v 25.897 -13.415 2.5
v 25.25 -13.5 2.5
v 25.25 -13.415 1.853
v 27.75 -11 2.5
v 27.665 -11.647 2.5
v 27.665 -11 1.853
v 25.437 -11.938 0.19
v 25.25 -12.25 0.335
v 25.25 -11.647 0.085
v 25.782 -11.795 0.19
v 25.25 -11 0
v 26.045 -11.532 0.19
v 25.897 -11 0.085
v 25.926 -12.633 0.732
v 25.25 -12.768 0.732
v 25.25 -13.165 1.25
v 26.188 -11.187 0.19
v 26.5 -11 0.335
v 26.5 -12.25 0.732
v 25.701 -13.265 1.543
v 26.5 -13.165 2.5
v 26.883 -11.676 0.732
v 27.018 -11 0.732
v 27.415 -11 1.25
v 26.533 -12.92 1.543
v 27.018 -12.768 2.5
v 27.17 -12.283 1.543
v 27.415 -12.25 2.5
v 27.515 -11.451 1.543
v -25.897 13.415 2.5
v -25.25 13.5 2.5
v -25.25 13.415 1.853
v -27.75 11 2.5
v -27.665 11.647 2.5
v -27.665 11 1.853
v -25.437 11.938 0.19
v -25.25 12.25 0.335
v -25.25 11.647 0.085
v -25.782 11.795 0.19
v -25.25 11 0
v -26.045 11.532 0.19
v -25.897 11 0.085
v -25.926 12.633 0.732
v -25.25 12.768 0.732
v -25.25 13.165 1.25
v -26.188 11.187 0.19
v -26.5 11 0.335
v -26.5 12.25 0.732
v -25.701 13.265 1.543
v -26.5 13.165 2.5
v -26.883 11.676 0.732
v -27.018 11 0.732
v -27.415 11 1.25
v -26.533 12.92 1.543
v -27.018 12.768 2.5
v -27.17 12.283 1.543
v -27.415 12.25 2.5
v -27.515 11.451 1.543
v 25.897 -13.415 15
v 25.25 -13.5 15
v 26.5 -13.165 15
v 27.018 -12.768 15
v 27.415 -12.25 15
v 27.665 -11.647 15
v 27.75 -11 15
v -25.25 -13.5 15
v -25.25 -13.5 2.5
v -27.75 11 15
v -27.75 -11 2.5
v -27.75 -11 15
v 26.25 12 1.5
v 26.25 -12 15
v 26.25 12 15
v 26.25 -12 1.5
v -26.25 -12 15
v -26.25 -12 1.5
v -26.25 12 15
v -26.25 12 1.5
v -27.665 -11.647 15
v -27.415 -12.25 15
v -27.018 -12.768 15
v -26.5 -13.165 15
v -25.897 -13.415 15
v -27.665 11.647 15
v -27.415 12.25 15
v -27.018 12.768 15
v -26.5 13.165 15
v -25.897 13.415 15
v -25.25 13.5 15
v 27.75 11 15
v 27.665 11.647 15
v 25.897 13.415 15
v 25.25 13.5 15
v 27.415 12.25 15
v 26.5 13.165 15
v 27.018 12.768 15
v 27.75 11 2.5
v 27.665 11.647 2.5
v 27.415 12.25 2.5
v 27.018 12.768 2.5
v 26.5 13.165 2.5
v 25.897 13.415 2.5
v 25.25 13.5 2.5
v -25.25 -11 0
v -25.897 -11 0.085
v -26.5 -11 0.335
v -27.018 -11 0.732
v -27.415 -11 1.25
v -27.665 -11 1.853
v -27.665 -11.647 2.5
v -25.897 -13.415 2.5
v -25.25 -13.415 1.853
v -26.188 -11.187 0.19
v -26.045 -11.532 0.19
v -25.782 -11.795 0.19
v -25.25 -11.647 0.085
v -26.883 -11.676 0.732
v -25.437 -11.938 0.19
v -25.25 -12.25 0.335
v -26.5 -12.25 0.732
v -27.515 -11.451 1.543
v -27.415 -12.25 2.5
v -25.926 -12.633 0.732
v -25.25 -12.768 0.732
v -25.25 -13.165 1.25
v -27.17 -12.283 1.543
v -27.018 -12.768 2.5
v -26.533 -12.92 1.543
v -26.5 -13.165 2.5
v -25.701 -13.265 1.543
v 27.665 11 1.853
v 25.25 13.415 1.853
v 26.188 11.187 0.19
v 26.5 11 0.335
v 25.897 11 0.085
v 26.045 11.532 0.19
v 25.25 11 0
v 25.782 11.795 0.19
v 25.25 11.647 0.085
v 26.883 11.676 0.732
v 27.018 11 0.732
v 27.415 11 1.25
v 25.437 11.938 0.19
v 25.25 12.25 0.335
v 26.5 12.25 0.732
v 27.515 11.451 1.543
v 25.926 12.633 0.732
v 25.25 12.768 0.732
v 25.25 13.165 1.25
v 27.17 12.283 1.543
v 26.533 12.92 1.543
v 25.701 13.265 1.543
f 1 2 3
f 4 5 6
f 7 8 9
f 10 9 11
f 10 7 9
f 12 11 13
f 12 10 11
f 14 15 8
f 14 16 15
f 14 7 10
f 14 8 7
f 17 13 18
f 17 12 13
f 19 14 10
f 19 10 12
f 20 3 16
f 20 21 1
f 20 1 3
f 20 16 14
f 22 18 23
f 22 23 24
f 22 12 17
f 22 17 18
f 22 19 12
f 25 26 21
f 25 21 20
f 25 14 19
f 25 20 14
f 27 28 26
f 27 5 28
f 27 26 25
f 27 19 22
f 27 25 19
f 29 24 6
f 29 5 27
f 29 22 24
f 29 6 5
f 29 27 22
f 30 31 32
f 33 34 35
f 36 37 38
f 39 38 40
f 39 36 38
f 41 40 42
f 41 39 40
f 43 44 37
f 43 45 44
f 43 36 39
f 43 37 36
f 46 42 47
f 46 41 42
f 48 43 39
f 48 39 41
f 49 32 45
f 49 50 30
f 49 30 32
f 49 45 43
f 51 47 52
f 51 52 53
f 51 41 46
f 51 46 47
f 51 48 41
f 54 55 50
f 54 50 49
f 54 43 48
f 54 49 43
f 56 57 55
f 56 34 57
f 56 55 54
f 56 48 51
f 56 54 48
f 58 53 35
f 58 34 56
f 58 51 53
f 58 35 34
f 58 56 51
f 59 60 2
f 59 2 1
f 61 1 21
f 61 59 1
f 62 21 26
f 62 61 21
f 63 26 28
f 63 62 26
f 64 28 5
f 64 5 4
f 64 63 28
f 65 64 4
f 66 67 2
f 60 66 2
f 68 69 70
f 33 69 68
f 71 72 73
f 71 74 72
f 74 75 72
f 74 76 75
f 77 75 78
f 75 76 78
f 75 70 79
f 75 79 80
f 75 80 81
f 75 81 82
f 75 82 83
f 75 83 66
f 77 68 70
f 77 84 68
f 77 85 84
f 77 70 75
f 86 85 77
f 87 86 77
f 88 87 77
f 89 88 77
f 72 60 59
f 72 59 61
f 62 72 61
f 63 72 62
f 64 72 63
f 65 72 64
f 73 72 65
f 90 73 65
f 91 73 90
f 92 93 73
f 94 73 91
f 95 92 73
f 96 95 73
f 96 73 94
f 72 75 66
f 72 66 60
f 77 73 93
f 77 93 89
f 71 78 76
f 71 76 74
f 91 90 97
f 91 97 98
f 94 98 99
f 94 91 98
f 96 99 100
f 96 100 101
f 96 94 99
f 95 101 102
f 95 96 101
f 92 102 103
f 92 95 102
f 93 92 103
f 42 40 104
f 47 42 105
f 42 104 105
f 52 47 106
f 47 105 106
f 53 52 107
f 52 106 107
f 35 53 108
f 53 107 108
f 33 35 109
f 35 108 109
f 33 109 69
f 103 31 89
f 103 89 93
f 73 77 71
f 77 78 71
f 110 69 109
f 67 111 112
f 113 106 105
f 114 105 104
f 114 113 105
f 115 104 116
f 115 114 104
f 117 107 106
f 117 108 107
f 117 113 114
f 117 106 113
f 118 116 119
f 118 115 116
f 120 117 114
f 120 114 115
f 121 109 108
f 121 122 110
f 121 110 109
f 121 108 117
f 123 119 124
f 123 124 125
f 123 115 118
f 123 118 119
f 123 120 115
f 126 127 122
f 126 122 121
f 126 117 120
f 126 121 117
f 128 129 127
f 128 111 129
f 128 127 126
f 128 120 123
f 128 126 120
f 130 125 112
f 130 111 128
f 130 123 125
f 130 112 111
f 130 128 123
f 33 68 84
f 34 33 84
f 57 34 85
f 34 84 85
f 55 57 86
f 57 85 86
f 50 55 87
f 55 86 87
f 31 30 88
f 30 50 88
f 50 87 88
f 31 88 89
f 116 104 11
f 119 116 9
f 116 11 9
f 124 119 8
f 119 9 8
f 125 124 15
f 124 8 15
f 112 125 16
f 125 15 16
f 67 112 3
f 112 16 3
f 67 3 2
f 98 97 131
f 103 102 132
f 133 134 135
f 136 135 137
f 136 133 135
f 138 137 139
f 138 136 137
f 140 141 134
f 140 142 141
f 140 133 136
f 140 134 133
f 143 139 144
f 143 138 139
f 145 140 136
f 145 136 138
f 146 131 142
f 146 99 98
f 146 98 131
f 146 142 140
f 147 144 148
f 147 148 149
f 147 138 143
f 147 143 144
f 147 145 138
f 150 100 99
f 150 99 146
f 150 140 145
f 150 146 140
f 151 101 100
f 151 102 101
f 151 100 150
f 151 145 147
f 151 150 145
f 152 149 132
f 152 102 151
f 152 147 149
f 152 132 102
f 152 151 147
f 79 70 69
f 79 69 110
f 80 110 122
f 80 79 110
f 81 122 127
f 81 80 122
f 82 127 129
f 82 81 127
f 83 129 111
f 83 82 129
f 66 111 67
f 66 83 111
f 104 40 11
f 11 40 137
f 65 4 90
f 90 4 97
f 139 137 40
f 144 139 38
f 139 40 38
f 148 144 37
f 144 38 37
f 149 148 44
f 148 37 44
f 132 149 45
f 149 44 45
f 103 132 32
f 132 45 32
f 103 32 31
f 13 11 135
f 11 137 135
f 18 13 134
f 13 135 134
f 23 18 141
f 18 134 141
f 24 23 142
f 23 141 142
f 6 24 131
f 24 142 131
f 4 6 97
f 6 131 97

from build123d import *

# Parameters (mm, degrees)
F0_W     = 55.5
F0_H     = 27
F1_DEPTH = 15
F2_T     = -1.5
F3_R     = 2.5
F4_R     = 2.5


with BuildPart() as f1:
    # F0 (on Top) → F1 (new body)
    with BuildSketch(Plane.XY):
        Rectangle(F0_W, F0_H)
    extrude(amount=F1_DEPTH)

    # F2
    f2_openings = [f1.faces().sort_by_distance(p)[0] for p in [
        (0, 0, 15),
    ]]
    offset(amount=F2_T, openings=f2_openings)

    # F3
    f3_edges = [f1.edges().sort_by_distance(p)[0] for p in [
        (27.75, 13.5, 7.5),
        (-27.75, 13.5, 7.5),
        (27.75, -13.5, 7.5),
        (-27.75, -13.5, 7.5),
    ]]
    fillet(f3_edges, radius=F3_R)

    # F4
    f4_edges = [f1.edges().sort_by_distance(p)[0] for p in [
        (27.75, 0, 0),
        (27.017767, -12.767767, 0),
        (27.017767, 12.767767, 0),
        (0, -13.5, 0),
        (0, 13.5, 0),
        (-27.017767, -12.767767, 0),
        (-27.017767, 12.767767, 0),
        (-27.75, 0, 0),
    ]]
    fillet(f4_edges, radius=F4_R)


solid = f1.part
